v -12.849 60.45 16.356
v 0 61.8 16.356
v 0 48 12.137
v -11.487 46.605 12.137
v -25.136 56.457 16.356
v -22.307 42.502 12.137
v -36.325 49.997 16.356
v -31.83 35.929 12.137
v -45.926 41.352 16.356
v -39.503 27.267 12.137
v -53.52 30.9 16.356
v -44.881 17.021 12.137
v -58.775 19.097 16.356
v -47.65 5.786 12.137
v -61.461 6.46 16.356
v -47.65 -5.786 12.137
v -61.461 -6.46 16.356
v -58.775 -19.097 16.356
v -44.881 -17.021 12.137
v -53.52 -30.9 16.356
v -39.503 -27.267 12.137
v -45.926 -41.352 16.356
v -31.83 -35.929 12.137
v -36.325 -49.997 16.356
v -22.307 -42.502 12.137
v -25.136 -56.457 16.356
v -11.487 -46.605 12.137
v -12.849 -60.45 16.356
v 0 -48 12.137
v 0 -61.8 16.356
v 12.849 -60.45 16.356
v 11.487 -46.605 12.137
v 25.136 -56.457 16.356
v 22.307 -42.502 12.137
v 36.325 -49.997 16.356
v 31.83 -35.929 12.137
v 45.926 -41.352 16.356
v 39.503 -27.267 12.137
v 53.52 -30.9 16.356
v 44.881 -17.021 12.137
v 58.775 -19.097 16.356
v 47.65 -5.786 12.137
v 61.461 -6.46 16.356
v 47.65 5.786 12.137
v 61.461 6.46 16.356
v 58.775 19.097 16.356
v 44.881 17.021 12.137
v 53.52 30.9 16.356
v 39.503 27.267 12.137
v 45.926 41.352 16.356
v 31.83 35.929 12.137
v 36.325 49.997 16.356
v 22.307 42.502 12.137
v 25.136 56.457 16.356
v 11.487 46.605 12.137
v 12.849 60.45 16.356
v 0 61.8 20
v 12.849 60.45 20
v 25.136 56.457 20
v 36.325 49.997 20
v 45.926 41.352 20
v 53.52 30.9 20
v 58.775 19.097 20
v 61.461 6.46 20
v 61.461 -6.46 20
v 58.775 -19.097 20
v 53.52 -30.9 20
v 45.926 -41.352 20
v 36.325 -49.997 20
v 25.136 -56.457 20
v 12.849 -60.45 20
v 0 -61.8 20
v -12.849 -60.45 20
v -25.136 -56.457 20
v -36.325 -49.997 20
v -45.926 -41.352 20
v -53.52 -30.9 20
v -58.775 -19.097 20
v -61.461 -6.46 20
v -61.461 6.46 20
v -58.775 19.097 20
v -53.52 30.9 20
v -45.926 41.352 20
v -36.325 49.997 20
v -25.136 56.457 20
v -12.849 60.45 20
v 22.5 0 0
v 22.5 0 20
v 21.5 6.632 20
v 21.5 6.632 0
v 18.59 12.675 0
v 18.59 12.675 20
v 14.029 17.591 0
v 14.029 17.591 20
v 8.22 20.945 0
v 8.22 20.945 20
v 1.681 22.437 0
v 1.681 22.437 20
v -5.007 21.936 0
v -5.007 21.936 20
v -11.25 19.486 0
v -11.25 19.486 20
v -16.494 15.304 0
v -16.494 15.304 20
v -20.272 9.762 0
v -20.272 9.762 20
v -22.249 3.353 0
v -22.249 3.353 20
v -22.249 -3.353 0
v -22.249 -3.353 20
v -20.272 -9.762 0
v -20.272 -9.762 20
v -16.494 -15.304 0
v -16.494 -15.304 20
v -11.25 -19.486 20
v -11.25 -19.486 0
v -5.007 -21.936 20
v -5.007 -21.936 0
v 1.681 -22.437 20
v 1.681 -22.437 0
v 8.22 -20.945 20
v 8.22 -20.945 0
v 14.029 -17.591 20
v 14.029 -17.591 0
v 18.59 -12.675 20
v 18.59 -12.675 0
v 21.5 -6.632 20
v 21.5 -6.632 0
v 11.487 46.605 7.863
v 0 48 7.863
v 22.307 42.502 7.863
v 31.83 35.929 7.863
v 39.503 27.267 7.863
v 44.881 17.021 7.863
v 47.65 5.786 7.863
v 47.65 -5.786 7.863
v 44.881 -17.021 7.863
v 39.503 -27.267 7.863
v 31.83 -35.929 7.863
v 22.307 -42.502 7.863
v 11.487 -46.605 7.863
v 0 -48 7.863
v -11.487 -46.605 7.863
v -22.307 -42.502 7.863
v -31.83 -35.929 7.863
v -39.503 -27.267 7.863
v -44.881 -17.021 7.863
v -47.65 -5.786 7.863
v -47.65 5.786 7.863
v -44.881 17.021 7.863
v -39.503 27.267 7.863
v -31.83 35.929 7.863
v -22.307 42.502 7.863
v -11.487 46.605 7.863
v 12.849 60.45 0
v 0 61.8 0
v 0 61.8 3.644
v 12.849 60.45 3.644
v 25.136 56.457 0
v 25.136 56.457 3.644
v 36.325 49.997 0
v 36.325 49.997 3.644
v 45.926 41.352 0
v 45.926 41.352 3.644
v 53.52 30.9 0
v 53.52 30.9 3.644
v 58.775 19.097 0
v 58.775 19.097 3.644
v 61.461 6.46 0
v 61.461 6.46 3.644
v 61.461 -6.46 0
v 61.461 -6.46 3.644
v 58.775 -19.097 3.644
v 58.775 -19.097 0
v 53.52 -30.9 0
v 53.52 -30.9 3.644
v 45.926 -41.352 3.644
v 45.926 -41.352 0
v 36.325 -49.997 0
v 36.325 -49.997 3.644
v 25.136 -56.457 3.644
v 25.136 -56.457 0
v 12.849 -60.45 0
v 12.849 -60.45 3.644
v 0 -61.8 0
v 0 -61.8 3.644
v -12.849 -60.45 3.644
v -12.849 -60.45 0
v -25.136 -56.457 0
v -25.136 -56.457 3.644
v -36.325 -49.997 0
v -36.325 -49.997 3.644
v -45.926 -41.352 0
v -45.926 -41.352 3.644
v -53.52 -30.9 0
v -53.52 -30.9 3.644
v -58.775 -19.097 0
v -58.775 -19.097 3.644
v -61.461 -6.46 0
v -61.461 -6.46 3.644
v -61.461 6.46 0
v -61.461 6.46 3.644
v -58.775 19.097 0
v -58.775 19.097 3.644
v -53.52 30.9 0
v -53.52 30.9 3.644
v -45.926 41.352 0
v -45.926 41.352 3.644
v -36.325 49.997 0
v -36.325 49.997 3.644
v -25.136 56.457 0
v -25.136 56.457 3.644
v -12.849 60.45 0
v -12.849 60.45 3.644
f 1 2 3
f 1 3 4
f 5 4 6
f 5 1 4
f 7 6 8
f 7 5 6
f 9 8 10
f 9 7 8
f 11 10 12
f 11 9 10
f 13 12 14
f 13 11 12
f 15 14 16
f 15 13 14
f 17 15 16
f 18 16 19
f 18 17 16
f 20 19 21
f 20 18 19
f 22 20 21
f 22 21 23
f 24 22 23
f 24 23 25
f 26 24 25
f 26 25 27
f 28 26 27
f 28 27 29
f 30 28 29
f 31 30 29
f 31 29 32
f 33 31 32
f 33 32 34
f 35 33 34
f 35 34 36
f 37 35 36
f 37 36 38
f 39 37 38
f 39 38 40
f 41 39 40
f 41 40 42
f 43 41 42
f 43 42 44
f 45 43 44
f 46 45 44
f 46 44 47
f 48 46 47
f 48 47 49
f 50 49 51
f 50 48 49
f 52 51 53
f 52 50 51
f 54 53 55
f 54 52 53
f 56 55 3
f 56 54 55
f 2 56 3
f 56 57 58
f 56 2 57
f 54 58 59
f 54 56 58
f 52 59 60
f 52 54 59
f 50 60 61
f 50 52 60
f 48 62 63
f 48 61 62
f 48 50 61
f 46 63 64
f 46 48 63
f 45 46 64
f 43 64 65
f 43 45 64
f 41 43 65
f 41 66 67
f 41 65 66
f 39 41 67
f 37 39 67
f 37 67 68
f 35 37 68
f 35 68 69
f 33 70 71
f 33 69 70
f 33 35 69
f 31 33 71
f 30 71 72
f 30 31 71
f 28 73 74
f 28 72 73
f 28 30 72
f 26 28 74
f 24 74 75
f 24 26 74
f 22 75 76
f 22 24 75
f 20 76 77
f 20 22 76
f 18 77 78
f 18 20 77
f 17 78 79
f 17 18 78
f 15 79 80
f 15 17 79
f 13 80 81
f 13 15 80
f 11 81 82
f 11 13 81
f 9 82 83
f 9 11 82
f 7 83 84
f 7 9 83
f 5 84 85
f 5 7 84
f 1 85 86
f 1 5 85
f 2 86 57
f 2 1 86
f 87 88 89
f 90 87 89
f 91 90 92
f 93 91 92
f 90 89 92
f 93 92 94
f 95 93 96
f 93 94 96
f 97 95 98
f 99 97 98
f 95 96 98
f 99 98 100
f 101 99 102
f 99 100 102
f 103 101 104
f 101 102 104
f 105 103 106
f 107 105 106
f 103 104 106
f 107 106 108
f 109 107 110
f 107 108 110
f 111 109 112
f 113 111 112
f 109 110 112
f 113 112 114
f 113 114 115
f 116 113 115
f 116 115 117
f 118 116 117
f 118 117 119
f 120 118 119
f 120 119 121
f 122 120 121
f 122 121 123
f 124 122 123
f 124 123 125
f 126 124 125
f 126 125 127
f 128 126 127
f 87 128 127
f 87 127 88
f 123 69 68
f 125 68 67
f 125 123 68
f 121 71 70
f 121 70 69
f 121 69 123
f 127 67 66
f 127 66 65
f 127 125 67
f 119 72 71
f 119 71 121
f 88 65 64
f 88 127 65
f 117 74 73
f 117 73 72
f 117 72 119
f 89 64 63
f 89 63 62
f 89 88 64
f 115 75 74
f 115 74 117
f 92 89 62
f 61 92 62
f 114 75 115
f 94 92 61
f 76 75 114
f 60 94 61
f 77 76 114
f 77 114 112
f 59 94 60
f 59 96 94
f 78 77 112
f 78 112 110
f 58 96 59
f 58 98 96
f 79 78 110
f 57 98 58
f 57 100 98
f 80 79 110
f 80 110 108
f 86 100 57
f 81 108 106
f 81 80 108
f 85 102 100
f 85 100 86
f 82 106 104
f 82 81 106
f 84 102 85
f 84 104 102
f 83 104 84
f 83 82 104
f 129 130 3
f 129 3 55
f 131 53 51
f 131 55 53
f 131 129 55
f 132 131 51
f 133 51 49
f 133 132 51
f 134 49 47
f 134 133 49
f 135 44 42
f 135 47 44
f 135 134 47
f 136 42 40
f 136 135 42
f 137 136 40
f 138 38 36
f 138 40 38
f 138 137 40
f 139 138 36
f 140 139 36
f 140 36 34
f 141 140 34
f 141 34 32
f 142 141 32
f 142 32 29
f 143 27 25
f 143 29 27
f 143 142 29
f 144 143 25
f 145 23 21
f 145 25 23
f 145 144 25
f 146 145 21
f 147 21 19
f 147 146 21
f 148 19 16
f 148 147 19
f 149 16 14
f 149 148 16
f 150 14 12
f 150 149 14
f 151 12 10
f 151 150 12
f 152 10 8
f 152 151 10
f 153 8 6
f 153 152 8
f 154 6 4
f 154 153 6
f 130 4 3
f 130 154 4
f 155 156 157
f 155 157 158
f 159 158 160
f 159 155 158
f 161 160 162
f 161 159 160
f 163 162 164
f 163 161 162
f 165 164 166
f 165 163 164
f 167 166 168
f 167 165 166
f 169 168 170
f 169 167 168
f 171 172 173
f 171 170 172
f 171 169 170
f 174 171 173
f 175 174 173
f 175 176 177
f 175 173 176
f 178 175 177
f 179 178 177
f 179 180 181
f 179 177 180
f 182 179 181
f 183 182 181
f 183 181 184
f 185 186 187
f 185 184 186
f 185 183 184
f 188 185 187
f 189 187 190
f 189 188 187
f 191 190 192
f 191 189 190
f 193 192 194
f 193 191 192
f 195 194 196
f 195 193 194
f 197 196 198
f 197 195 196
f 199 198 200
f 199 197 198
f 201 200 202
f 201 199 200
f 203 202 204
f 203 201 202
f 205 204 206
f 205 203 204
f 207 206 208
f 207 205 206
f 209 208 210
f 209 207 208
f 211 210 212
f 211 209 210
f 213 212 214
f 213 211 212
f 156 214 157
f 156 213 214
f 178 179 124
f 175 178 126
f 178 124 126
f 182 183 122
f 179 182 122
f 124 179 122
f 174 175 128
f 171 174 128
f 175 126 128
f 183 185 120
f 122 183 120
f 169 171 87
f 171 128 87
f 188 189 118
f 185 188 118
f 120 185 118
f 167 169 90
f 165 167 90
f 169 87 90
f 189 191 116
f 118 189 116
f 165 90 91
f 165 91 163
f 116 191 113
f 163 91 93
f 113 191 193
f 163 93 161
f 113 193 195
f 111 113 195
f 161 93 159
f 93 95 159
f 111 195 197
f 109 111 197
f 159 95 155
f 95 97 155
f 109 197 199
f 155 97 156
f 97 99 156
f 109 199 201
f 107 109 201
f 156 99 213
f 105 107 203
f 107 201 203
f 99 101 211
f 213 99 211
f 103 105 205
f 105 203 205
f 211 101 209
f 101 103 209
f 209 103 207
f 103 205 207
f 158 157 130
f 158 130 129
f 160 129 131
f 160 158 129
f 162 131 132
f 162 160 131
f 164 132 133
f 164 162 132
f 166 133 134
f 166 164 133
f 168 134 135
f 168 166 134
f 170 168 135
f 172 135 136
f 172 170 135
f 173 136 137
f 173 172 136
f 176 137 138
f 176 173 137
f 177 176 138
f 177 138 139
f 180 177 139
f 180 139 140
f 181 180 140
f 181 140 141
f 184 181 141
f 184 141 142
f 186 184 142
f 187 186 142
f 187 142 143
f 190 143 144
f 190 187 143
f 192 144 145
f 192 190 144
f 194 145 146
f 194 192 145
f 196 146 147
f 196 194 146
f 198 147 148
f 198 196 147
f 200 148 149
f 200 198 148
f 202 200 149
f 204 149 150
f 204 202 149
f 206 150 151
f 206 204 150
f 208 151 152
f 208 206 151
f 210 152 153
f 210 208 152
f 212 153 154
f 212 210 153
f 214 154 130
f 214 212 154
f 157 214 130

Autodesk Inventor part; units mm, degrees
ref_plane "YZ Plane" through (0, 0, 0) normal (1, 0, 0) x (0, 1, 0)
ref_plane "XZ Plane" through (0, 0, 0) normal (0, 1, 0) x (-1, 0, 0)
sketch "Boceto principal" plane through (0, 0, 0) normal (1, 0, 0) x (0, 1, 0)
  line L0 (0, 20) -> (61.8, 20)
  line L1 (61.8, 20) -> (61.8, 16.356)
  line L2 (61.8, 16.356) -> (48, 12.137)
  line L3 (48, 12.137) -> (48, 7.863)
  line L4 (48, 7.863) -> (61.8, 3.644)
  line L5 (61.8, 3.644) -> (61.8, 0)
  line L6 (61.8, 0) -> (0, 0)
  line L7 (59, 15.5) -> (59, 4.5) construction
  line L8 (48, 10) -> (59, 10) construction
  line L9 (61.8, 16.356) -> (61.8, 3.644)
  line L10 (0, -4) -> (0, 24) projected
  line L11 (0, 0) -> (0, 20)
  dimension "d0" = 11
  dimension "d1" = 34
  dimension "d2" = 2.8
  dimension "d6" = 20
  dimension "d21" = 118
  dimension "d25" = 13.8
  dimension "d27" = 10
ref_plane "Plano de correa" through (0, 48, 10) normal (0, 0, 1) x (1, 0, 0)
revolve "Cuerpo" add sketch "Boceto principal" angle 360 about axis through (0, 0, -10) along (0, 0, 1)
revolve "Para ranuras" cut sketch "Boceto principal" angle 360 about axis through (0, 0, -10) along (0, 0, 1) contours L9 L4 L3 L2
fillet "Empalme externo" [suppressed]
fillet "Empalme interno" [suppressed]
pattern_of_one "Patrón para ranuras"
sketch "Boceto2" plane through (0, 0, 20) normal (0, 0, 1) x (1, 0, 0)
  circle A0 centre (0, 0) radius 22.5
  dimension "d28" = 45
extrude "Extrusión1" cut sketch "Boceto2" against normal blind 30
equation "\"d0\" = da_Bw"
equation "\"d1\" = da_Alfa"
equation "\"d2\" = da_c"
equation "\"d21\" = da_Dw"
equation "\"d25\" = da_Hd"
equation "\"d27\" = da_Se"
equation "\"da_r1\" = 0"
equation "\"da_r2\" = 0"
equation "\"d18\" = da_Sg"
equation "\"da_Bw\" = 11"
equation "\"da_Alfa\" = 34deg"
equation "\"da_c\" = 2.8"
equation "\"da_Dw\" = 118"
equation "\"da_Hd\" = 13.8"
equation "\"da_Se\" = 10"
equation "\"da_Sg\" = 15"
properties part number "Polea ranurada1" material "Steel"
